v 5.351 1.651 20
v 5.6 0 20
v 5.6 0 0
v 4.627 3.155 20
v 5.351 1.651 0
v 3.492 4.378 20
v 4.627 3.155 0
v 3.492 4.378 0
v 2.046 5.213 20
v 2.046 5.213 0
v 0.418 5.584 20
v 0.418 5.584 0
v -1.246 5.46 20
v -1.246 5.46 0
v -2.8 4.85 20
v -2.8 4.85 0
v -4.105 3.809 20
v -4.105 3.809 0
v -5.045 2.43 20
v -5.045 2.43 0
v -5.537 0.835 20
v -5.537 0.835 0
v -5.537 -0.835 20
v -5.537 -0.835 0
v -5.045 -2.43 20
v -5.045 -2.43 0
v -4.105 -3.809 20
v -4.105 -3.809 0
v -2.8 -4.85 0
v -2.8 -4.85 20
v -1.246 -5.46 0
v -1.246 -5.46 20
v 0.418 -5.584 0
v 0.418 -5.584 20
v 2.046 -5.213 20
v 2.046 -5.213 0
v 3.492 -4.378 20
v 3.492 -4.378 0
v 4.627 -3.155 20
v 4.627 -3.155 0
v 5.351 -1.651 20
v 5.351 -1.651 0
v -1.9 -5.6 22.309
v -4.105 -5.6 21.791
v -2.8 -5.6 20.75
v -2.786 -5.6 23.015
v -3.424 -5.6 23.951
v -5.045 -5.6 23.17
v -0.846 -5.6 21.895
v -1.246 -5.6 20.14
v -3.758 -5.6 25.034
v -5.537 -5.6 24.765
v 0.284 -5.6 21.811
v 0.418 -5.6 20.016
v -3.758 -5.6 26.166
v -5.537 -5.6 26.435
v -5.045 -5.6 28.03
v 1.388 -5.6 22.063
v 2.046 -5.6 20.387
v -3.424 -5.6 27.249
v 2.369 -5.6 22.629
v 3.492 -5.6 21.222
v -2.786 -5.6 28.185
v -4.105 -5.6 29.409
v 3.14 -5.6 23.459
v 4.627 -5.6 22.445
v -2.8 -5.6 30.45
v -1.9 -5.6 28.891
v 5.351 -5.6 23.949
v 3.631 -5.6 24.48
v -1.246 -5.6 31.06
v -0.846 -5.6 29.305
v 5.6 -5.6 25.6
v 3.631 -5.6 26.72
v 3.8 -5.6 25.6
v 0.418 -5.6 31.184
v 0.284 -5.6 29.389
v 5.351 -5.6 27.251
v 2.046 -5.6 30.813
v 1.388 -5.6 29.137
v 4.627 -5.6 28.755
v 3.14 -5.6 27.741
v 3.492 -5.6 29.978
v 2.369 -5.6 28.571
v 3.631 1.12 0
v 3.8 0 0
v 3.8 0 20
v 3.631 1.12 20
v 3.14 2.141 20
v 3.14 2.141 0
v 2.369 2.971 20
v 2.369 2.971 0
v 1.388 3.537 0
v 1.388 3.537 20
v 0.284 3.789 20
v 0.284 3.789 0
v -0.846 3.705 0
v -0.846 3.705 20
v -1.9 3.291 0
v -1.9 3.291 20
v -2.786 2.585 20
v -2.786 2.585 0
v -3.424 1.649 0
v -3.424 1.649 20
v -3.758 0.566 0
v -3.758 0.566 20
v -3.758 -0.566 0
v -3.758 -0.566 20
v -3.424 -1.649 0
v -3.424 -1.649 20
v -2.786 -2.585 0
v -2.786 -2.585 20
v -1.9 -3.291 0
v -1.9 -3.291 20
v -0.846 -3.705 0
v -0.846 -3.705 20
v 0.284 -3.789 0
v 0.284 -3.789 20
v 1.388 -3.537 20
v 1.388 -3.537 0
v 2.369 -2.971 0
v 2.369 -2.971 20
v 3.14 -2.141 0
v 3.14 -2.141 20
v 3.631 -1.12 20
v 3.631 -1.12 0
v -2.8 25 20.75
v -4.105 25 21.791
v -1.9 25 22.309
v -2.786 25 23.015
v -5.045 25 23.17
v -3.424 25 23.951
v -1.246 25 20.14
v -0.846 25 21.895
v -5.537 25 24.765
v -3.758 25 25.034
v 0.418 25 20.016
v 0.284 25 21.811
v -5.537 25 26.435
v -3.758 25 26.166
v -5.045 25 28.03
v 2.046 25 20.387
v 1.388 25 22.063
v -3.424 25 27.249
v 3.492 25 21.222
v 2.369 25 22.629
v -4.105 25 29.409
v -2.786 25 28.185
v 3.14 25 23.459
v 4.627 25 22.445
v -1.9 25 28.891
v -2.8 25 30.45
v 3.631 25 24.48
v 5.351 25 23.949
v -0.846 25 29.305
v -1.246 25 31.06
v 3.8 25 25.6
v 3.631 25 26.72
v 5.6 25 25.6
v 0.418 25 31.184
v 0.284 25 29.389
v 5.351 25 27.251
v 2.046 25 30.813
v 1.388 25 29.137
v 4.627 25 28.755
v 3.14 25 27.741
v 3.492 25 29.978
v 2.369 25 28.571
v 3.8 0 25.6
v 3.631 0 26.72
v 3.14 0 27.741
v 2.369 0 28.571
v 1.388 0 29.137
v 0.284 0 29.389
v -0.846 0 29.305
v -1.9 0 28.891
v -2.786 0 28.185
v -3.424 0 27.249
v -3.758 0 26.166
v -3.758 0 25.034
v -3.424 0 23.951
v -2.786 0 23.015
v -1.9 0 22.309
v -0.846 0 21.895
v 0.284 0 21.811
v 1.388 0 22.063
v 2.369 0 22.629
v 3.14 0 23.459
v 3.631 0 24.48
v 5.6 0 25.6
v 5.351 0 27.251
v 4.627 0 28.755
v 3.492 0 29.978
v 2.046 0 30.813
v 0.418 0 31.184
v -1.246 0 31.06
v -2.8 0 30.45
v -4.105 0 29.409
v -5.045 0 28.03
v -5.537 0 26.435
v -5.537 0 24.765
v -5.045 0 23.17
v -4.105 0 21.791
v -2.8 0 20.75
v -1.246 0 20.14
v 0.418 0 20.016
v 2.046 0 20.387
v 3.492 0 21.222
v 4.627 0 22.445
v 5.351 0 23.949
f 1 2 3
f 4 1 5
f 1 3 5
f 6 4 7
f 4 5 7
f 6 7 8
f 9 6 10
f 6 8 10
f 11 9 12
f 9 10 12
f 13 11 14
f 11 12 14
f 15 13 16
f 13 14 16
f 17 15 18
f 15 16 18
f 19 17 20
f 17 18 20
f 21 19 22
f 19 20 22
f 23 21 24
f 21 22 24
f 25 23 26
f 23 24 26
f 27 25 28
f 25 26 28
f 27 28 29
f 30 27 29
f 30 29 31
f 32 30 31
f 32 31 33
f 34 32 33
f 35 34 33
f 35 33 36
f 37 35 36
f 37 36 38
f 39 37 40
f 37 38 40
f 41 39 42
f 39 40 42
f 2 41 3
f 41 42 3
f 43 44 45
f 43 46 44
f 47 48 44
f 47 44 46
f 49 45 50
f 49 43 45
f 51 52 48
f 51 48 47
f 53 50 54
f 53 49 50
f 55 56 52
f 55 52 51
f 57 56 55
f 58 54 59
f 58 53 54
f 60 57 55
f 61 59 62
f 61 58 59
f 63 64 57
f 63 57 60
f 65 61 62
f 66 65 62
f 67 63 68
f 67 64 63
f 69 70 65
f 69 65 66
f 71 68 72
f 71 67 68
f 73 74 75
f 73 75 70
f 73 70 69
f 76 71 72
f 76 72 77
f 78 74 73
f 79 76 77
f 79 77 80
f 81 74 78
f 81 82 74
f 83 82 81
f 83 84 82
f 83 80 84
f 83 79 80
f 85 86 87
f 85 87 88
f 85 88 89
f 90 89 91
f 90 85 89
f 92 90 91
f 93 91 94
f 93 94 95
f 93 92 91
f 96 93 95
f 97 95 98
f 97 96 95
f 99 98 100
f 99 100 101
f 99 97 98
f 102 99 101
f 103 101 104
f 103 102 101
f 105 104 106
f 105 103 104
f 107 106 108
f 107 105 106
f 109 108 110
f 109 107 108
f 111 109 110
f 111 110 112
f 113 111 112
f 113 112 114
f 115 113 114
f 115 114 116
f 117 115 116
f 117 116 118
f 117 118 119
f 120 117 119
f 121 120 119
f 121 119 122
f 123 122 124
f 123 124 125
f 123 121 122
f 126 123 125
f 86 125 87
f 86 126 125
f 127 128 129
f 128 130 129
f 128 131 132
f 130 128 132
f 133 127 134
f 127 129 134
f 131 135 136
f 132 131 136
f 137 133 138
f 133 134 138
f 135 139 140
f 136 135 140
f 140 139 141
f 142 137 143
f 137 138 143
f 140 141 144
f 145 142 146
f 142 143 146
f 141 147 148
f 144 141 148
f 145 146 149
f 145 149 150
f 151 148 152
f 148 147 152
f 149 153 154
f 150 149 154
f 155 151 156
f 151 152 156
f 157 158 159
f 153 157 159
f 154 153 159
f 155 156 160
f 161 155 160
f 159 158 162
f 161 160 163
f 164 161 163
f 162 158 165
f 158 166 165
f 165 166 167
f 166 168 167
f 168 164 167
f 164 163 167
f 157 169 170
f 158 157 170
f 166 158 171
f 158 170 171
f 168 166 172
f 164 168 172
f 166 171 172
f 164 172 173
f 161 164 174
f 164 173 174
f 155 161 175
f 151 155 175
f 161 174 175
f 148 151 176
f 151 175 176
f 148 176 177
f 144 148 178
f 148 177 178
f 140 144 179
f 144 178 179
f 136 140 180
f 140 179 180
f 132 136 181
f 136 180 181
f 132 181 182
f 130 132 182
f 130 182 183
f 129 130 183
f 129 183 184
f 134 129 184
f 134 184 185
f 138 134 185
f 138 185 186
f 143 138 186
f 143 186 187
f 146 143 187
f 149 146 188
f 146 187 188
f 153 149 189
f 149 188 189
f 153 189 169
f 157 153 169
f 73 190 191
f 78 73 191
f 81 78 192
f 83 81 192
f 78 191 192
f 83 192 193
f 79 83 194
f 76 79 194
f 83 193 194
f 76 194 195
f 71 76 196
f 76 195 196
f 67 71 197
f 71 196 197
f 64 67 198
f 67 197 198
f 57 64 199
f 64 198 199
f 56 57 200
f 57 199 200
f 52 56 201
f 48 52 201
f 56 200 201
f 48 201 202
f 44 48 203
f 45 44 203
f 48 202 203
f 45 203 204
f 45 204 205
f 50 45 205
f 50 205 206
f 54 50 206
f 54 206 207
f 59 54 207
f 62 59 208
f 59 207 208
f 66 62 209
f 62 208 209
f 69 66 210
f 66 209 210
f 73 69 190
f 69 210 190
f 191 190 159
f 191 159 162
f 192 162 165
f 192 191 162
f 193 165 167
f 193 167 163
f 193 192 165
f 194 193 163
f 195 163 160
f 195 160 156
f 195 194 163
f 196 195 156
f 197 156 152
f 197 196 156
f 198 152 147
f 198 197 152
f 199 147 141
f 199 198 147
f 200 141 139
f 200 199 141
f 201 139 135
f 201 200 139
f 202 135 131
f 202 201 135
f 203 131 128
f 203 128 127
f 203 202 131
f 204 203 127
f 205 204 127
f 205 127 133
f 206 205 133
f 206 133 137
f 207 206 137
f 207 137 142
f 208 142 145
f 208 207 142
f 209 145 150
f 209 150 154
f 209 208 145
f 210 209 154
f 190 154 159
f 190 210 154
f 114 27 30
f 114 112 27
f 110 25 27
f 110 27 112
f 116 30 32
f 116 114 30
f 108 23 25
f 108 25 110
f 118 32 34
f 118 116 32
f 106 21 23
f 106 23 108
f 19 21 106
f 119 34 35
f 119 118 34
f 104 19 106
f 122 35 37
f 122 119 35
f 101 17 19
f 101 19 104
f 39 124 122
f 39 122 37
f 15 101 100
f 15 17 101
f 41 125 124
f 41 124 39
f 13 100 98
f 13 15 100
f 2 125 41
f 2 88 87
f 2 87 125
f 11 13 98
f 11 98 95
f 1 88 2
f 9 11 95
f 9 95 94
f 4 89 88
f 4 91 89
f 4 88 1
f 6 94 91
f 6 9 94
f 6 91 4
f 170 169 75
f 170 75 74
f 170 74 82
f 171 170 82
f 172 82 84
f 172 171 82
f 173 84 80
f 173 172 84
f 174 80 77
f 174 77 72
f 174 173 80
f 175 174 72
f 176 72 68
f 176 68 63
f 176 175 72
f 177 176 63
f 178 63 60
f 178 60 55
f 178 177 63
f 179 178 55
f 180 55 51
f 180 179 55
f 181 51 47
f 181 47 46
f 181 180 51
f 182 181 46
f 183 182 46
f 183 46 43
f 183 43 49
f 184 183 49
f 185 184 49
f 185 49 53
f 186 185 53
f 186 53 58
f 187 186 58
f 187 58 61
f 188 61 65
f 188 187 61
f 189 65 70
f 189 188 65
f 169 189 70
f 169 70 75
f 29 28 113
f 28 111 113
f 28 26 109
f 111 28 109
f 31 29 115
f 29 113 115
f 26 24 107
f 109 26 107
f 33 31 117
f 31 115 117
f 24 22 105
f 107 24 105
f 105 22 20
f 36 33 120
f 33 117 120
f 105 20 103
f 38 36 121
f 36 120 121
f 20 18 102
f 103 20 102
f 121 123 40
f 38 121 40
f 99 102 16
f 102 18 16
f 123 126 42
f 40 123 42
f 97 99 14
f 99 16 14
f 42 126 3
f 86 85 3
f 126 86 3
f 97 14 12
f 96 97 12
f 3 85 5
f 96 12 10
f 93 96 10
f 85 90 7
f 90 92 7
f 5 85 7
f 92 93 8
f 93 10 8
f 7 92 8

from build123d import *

# Parameters (mm, degrees)
F0_R          = 5.6
F0_R_2        = 3.8
F1_DEPTH      = 20
F2_R          = 5.6
F2_R_2        = 3.8
F3_DEPTH      = 25
F3_DEPTH_BACK = 5.6


with BuildPart() as f1:
    # F0 (on Top) → F1 (new body)
    with BuildSketch(Plane.XY):
        Circle(F0_R)
        Circle(F0_R_2, mode=Mode.SUBTRACT)
    extrude(amount=F1_DEPTH)


with BuildPart() as f3:
    # F2 (on Front) → F3 (new body, two sides)
    with BuildSketch(Plane.XZ) as f3_sk:
        with Locations((0, 25.6)):
            Circle(F2_R)
        with Locations((0, 25.6)):
            Circle(F2_R_2, mode=Mode.SUBTRACT)
    extrude(amount=-F3_DEPTH)
    extrude(f3_sk.sketch, amount=F3_DEPTH_BACK)


solid = Compound([f1.part, f3.part])
